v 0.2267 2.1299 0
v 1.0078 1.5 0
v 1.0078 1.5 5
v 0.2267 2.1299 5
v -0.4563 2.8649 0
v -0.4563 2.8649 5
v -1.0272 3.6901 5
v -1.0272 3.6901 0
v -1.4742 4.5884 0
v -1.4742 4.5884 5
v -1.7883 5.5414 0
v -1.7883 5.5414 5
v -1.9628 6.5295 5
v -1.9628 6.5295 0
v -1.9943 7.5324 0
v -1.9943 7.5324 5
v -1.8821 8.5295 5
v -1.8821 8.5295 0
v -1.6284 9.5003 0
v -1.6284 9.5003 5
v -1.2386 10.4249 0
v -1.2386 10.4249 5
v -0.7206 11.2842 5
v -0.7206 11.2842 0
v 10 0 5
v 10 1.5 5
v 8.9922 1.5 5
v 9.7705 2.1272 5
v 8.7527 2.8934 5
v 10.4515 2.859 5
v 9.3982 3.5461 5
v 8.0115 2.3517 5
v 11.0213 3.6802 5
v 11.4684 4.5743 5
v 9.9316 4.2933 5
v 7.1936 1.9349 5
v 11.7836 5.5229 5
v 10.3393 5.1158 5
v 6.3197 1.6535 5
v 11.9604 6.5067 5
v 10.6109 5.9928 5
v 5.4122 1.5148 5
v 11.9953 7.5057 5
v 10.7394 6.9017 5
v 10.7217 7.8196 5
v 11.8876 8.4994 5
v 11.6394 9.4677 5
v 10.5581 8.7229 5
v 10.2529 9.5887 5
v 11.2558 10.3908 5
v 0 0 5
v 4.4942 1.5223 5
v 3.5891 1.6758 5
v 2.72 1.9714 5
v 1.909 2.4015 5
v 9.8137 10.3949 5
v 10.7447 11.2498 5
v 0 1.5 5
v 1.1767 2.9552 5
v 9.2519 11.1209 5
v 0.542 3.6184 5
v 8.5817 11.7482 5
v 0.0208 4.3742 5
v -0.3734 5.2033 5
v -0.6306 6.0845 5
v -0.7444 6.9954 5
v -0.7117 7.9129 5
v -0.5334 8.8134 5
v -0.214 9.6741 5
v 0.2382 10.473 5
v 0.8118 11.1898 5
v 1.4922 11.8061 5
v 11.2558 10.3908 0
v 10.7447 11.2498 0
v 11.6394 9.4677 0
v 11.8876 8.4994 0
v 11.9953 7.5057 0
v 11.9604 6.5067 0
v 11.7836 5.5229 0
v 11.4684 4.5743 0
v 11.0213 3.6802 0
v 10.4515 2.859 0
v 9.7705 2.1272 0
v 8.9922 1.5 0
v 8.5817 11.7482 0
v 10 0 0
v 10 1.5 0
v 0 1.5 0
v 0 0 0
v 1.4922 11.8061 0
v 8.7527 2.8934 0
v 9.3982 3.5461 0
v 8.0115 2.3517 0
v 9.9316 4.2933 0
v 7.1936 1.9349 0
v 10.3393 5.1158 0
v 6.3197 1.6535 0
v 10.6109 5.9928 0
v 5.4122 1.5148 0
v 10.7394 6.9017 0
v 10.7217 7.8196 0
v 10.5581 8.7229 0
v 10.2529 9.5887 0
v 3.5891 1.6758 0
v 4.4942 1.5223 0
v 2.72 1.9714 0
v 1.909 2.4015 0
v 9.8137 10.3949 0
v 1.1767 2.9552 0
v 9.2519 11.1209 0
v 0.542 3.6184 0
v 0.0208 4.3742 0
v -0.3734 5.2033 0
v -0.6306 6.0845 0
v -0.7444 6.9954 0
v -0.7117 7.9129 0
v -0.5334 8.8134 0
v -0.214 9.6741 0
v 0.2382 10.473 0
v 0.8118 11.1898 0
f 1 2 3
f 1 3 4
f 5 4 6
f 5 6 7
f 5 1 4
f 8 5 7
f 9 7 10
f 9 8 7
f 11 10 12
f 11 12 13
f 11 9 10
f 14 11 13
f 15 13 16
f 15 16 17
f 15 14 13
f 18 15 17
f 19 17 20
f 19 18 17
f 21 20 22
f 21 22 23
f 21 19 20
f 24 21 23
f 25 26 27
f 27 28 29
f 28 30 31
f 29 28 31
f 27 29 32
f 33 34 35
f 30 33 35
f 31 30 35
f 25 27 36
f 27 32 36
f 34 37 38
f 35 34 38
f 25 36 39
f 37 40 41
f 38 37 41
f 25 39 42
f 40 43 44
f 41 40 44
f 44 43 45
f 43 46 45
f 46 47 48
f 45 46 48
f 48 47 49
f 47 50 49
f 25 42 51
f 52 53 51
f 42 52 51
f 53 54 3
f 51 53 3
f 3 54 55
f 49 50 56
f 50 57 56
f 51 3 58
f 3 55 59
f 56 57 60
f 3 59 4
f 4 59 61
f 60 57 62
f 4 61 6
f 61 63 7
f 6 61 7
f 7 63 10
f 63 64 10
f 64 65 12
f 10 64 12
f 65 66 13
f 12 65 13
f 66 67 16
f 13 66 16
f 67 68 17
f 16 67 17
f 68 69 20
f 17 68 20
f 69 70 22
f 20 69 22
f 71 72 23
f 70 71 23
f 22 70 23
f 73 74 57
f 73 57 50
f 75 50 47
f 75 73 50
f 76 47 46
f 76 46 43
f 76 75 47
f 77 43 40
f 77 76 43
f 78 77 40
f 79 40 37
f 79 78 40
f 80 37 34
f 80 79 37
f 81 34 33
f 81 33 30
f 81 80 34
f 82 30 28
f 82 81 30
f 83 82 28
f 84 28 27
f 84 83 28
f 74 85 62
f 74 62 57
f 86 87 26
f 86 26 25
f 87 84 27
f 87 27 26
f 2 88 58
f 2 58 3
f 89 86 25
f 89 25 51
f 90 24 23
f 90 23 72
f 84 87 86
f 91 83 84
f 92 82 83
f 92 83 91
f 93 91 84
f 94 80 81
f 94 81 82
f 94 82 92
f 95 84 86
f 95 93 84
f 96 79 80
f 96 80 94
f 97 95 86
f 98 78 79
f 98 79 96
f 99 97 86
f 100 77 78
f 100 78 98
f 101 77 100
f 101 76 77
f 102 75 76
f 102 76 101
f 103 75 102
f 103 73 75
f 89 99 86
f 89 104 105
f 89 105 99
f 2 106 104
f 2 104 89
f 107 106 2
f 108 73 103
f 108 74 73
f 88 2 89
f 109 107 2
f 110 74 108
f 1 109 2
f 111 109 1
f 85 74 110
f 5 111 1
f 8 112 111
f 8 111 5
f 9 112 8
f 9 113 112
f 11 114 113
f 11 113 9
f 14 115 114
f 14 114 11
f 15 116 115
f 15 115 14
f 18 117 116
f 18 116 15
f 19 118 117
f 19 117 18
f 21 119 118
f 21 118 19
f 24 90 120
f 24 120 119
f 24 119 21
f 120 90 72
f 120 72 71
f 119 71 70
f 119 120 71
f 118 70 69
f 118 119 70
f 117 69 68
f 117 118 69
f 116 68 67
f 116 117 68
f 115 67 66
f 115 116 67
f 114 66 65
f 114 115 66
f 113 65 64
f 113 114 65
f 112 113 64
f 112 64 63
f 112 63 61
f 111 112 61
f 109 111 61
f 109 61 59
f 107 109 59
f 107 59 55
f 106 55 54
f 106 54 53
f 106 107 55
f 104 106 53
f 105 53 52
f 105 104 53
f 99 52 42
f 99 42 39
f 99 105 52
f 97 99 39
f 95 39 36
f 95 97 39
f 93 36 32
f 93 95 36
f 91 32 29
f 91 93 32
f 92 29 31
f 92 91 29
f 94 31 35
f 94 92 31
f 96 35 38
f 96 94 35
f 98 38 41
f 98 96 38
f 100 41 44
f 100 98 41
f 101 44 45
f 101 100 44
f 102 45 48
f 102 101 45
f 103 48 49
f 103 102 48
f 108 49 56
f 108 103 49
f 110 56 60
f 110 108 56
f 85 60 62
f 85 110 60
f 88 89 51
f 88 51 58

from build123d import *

# Parameters (mm, degrees)
EXTRUDE_1_DEPTH = 5


with BuildPart() as part:
    # 草图1 → 凸台-拉伸1 (new body)
    with BuildSketch(Plane.XY):
        with BuildLine():
            Line((8.992179856, 1.5), (10, 1.5))
            Line((10, 1.5), (10, 0))
            Line((10, 0), (0, 0))
            Line((0, 0), (0, 1.5))
            Line((0, 1.5), (1.007820144, 1.5))
            ThreePointArc((1.007820144, 1.5), (-1.893270413, 6.032287794), (-0.720584593, 11.284217633))
            Line((-0.720584593, 11.284217633), (1.492224546, 11.806096066))
            ThreePointArc((1.492224546, 11.806096066), (4.953081958, 1.500191421), (8.581658268, 11.748246776))
            Line((8.581658268, 11.748246776), (10.744690333, 11.249816618))
            ThreePointArc((10.744690333, 11.249816618), (11.889585712, 6.011610437), (8.992179856, 1.5))
        make_face()
    extrude(amount=EXTRUDE_1_DEPTH)


solid = part.part
